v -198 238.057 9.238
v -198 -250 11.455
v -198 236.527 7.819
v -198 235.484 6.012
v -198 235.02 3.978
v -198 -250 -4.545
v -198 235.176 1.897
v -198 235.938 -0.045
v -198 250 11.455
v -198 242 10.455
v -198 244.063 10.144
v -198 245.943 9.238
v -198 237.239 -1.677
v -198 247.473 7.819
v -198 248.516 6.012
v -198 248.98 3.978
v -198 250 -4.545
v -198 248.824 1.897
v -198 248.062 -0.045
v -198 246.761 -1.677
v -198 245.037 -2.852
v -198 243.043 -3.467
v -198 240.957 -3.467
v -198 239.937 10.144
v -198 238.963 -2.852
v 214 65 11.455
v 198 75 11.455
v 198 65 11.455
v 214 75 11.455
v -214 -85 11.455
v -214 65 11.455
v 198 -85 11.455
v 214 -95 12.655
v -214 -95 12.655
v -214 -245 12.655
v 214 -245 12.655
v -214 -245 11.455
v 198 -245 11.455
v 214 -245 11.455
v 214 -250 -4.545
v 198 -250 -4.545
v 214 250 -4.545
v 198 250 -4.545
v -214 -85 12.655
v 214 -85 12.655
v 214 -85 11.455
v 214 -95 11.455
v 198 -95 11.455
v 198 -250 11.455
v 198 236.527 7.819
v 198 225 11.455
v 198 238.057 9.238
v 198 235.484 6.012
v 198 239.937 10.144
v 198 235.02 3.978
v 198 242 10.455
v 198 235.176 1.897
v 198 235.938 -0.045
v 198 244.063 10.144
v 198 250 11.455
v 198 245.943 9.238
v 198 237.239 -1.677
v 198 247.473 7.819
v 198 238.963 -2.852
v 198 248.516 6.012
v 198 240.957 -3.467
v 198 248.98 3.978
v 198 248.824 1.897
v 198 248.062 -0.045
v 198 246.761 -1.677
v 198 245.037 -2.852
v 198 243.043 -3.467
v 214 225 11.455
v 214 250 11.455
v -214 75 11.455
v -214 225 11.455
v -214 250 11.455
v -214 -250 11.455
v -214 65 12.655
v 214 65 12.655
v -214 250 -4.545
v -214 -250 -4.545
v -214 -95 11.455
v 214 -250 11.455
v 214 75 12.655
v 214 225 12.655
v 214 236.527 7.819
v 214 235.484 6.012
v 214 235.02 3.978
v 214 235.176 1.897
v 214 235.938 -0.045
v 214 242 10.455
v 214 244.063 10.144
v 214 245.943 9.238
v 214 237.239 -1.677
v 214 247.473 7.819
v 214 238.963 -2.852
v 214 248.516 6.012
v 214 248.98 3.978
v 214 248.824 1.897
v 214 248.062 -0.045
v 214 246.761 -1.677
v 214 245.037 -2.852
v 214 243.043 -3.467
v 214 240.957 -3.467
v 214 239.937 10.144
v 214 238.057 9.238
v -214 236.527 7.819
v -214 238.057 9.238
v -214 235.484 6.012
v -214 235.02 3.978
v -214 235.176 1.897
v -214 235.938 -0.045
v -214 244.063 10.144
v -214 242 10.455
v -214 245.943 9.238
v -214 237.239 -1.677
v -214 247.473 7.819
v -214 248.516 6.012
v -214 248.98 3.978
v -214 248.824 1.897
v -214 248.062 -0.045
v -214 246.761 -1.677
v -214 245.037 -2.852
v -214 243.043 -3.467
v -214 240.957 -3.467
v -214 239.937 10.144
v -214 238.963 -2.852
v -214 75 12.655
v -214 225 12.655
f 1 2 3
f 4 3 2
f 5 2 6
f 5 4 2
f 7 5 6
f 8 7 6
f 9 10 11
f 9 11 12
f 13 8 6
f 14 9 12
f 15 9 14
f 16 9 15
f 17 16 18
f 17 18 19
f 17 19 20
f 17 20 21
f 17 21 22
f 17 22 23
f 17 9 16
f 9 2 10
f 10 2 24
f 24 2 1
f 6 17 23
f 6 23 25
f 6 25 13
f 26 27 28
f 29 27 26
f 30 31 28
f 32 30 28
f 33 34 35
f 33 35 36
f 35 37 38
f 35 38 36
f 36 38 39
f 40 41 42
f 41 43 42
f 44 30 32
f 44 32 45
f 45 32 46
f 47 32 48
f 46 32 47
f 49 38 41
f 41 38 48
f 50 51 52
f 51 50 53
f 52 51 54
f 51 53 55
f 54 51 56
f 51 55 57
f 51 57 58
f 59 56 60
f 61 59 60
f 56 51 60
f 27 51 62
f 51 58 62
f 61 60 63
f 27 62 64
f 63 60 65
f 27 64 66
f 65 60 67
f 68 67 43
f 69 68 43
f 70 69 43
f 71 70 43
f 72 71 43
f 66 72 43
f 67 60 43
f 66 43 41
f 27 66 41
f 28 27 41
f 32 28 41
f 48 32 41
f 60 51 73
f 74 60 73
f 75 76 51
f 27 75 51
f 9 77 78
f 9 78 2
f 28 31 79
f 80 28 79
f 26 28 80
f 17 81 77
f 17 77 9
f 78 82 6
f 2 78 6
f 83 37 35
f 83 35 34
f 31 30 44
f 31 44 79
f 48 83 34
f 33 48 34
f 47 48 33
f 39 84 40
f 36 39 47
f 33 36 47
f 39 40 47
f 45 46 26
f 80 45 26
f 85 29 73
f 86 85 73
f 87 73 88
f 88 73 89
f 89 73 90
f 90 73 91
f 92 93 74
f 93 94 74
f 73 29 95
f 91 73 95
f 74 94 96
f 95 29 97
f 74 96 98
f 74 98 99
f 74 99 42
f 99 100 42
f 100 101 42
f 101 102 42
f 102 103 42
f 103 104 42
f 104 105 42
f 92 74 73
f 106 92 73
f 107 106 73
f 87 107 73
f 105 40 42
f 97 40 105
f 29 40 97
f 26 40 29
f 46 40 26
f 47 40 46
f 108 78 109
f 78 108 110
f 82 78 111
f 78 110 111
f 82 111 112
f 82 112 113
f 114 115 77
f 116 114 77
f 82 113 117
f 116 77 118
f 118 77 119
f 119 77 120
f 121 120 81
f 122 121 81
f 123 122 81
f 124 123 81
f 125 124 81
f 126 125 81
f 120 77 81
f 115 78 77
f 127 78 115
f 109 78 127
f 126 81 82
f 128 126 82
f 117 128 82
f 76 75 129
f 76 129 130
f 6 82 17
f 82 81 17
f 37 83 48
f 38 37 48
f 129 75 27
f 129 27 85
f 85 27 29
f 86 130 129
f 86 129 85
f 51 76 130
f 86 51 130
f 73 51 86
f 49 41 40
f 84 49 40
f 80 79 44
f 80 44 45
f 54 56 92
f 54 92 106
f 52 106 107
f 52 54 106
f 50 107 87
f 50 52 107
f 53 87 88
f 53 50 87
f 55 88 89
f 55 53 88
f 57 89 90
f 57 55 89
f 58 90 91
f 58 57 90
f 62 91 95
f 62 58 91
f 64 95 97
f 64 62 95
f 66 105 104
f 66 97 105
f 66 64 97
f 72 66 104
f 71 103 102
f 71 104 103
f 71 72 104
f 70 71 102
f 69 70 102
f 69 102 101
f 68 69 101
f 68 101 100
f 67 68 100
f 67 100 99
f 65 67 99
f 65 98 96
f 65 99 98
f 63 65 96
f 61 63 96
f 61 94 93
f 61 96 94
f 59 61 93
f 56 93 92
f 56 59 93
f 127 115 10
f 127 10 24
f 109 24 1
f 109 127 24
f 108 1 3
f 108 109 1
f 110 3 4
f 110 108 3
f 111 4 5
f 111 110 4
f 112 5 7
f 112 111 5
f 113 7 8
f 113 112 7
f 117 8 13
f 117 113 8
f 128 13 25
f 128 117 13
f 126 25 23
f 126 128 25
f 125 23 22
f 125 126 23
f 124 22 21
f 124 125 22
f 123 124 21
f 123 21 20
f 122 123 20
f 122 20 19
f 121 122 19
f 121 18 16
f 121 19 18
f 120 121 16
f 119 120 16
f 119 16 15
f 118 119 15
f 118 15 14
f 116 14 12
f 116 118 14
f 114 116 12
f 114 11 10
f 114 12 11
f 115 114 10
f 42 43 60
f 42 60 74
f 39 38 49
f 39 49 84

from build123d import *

# Parameters (mm, degrees)
SKETCH1_W               = 16
SKETCH1_H               = 16
BOSS_EXTRUDE1_DEPTH     = 250
BOSS_EXTRUDE1_2_DEPTH   = 250
SKETCH2_W               = 428
SKETCH2_H               = 150
BOSS_EXTRUDE2_DEPTH     = 1.2
CUT_EXTRUDE1_DEPTH      = 483.083123041
CUT_EXTRUDE1_DEPTH_BACK = 483.083123041
SKETCH3_R               = 7


with BuildPart() as part:
    # Sketch1 → Boss-Extrude1 (new, symmetric)
    with BuildSketch(Plane(origin=(0, 0, 0), x_dir=(1, 0, 0), z_dir=(0, 1, 0))):
        with Locations((-206, -3.454545455)):
            Rectangle(SKETCH1_W, SKETCH1_H)
    extrude(amount=BOSS_EXTRUDE1_DEPTH, both=True)


with BuildPart() as body_2:
    # Sketch1 → Boss-Extrude1 2 (new, symmetric)
    with BuildSketch(Plane(origin=(0, 0, 0), x_dir=(1, 0, 0), z_dir=(0, 1, 0))):
        with Locations((206, -3.454545455)):
            Rectangle(SKETCH1_W, SKETCH1_H)
    extrude(amount=BOSS_EXTRUDE1_2_DEPTH, both=True)

    # Sketch2 → Boss-Extrude2 (add)
    with BuildSketch(Plane.XY.offset(11.454545455)):
        with Locations((0, 150)):
            Rectangle(SKETCH2_W, SKETCH2_H)
        with Locations((0, -10)):
            Rectangle(SKETCH2_W, SKETCH2_H)
        with Locations((0, -170)):
            Rectangle(SKETCH2_W, SKETCH2_H)
    extrude(amount=BOSS_EXTRUDE2_DEPTH)


with BuildPart() as cut_extrude1_tool:
    # Sketch3 → Cut-Extrude1 (new, two sides: drawn at the far end of the back side and taken through both)
    with BuildSketch(Plane(origin=(-198, 0, 0), x_dir=(0, 0, -1), z_dir=(1, 0, 0)).offset(-CUT_EXTRUDE1_DEPTH_BACK)):
        with Locations(Location((-3.454545455, 242, 0), (0, 0, 180))):
            Circle(SKETCH3_R)
    extrude(amount=CUT_EXTRUDE1_DEPTH + CUT_EXTRUDE1_DEPTH_BACK)


with BuildPart() as part_1:
    add(part.part)

    # Cut-Extrude1: cut by cut_extrude1_tool
    add(cut_extrude1_tool.part, mode=Mode.SUBTRACT)


with BuildPart() as body_2_1:
    add(body_2.part)

    # Cut-Extrude1: cut by cut_extrude1_tool
    add(cut_extrude1_tool.part, mode=Mode.SUBTRACT)


solid = Compound([part_1.part, body_2_1.part])
